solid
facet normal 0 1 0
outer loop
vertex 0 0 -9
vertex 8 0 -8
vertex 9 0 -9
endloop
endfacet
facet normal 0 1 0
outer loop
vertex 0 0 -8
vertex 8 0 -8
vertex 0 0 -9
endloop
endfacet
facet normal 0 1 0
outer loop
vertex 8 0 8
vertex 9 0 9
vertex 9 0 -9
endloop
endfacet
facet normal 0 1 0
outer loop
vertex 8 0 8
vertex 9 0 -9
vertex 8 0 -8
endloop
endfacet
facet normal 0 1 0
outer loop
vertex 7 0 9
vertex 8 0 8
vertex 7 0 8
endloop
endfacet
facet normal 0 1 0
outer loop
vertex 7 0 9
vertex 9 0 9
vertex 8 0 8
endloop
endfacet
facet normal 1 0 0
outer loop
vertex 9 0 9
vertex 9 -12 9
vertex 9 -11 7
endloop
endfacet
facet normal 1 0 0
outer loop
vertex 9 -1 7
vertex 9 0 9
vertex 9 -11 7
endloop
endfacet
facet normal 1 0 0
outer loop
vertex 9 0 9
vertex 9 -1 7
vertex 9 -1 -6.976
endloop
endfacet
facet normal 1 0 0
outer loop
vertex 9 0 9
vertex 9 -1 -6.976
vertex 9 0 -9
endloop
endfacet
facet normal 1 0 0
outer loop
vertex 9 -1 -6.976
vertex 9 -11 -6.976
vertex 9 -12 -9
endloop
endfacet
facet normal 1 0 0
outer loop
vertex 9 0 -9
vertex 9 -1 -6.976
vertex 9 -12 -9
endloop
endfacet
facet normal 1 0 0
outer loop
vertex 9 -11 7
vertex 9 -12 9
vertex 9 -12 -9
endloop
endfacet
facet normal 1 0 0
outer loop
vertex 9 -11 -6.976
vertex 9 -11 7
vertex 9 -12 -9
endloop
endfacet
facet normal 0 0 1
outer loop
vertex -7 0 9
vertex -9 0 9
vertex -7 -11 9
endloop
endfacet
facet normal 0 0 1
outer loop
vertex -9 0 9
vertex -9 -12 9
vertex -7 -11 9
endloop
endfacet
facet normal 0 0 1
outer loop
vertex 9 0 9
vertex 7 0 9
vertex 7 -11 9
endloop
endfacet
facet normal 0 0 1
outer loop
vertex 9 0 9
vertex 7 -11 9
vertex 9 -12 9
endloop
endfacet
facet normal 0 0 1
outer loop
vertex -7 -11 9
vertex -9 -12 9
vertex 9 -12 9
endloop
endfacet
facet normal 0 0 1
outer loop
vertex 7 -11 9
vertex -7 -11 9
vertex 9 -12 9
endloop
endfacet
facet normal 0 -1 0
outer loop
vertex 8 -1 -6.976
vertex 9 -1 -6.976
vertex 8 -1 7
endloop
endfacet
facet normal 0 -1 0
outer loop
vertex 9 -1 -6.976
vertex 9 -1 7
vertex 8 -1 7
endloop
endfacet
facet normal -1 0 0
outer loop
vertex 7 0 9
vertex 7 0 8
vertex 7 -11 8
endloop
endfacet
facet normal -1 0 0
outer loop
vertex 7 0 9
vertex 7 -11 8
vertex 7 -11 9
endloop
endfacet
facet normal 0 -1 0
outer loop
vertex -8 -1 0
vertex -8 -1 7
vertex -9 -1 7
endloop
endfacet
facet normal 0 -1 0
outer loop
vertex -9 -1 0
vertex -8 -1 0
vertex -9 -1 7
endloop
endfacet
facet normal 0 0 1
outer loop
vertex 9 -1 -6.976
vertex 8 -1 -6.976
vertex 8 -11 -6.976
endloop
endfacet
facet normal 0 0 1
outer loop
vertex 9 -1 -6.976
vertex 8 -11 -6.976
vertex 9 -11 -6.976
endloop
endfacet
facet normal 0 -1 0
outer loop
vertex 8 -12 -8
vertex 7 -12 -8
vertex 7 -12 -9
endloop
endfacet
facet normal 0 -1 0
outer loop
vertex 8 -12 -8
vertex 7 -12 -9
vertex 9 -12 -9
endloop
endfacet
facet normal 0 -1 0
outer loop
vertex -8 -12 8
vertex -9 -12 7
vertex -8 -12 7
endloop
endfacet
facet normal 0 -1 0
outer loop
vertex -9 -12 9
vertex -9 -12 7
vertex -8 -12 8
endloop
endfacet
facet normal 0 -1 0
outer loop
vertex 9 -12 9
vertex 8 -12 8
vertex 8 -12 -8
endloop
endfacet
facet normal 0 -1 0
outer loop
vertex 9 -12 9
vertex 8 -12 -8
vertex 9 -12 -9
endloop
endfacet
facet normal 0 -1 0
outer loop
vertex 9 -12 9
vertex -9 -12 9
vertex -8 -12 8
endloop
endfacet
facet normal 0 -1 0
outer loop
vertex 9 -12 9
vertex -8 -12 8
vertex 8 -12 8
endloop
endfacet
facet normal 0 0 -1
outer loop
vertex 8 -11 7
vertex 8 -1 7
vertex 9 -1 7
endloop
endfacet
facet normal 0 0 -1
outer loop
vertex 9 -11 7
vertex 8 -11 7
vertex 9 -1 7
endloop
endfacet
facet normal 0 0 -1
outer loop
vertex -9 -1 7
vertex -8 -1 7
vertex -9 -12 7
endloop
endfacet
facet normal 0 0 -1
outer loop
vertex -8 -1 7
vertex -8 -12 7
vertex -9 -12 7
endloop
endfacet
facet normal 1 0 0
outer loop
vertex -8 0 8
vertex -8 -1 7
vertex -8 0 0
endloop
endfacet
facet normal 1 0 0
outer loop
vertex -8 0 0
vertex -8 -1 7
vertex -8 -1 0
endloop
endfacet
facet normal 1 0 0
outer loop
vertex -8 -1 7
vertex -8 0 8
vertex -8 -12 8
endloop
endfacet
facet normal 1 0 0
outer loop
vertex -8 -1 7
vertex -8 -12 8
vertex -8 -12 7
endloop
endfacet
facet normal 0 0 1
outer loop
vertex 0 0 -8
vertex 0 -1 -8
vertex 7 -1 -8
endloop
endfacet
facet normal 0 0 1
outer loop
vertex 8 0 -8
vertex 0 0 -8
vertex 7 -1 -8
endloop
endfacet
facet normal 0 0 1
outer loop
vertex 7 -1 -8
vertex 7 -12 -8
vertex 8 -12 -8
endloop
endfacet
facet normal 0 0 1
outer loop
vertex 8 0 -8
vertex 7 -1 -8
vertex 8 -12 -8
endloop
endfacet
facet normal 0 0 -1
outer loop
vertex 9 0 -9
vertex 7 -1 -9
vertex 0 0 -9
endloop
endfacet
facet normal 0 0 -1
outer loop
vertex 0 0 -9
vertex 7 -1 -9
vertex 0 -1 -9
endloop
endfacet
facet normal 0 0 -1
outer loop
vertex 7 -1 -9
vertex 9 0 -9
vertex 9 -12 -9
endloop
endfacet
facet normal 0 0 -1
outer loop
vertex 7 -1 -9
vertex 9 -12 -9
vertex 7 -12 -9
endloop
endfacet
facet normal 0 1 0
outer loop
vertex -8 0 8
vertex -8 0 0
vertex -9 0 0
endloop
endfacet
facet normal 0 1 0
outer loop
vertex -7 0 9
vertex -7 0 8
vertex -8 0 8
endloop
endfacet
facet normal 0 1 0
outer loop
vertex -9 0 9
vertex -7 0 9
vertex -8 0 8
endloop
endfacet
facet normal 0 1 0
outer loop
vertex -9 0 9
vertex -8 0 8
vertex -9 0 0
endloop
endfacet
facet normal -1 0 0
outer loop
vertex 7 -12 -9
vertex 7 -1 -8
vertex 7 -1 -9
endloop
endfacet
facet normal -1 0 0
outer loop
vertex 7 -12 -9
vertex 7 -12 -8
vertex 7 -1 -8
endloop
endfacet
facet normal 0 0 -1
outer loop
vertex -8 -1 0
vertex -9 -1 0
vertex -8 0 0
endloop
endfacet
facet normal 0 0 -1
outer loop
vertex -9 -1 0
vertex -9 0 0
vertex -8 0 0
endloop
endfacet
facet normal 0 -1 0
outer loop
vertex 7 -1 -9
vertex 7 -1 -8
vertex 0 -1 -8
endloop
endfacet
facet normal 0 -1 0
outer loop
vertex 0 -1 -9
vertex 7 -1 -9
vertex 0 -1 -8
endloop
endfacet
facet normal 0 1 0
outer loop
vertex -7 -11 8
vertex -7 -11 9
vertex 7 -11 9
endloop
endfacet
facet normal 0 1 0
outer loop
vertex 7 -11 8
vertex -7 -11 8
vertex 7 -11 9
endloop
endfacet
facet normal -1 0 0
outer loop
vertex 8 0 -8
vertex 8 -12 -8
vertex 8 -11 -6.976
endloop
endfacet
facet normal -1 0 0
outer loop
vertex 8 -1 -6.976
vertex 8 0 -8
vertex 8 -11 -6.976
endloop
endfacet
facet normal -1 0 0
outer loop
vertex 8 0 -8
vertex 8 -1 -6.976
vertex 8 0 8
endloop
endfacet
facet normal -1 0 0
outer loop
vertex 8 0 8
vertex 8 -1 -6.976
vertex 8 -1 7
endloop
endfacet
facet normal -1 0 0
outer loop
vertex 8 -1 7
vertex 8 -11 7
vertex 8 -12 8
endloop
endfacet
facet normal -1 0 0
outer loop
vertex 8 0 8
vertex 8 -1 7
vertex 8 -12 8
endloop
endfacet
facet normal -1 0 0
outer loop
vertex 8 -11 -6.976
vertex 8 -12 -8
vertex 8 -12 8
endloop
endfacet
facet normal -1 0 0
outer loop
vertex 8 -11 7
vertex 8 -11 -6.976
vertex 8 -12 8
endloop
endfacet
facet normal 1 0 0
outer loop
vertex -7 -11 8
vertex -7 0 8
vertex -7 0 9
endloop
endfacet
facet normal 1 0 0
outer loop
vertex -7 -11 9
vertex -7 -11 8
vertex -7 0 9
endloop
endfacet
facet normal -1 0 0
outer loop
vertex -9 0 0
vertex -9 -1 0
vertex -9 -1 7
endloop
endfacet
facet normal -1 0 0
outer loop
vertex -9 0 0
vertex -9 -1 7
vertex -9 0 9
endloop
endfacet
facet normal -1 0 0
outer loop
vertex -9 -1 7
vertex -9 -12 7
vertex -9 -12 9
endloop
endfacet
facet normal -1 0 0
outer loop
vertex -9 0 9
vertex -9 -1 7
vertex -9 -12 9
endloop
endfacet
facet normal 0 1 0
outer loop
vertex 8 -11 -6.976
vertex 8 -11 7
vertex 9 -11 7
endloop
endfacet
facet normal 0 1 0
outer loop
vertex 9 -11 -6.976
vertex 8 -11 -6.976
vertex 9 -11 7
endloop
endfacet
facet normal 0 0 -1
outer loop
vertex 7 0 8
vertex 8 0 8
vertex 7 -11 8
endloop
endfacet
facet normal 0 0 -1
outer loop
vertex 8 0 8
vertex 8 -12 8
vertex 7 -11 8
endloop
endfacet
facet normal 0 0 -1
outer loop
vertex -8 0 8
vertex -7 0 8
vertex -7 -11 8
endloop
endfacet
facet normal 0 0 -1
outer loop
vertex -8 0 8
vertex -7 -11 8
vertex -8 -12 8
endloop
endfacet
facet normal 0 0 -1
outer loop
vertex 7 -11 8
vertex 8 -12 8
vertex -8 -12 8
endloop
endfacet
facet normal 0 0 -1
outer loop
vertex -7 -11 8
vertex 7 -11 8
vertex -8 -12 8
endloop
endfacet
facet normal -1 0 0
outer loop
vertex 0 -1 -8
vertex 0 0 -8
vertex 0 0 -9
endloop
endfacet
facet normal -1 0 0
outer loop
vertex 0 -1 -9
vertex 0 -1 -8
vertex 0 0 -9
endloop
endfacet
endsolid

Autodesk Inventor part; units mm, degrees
ref_plane "YZ Plane" through (0, 0, 0) normal (1, 0, 0) x (0, 1, 0)
ref_plane "XZ Plane" through (0, 0, 0) normal (0, 1, 0) x (-1, 0, 0)
ref_plane "XY Plane" through (0, 0, 0) normal (0, 0, 1) x (1, 0, 0)
sketch "Sketch1" plane through (0, 0, 0) normal (0, 1, 0) x (-1, 0, 0)
  line L0 (-9, -9) -> (-9, 9)
  line L1 (-9, 9) -> (9, 9)
  line L2 (-8, -8) -> (-8, 8)
  line L3 (-8, 8) -> (8, 8)
  line L4 (0, -8) -> (0, -9)
  line L5 (0, -9) -> (-1, -9)
  line L6 (-8, -8) -> (0, -8)
  line L7 (-9, -9) -> (0, -9)
  line L8 (9, 0) -> (9, 9)
  line L9 (8, 8) -> (8, 1)
  line L10 (9, 0) -> (8, 0)
  line L11 (8, 0) -> (8, 1.1953)
  line L12 (8, 8) -> (8, 9)
  line L13 (-8, 8) -> (-8, 9)
  line L14 (9, 9) -> (8, 9)
  line L15 (-8, 9) -> (-9, 9)
  line L16 (8, 8) -> (7, 8)
  line L17 (7, 8) -> (7, 9)
  line L18 (-8, 8) -> (-7, 8)
  line L19 (-7, 9) -> (-8, 9)
  line L20 (-8, 8) -> (-7, 8)
  line L21 (-7, 8) -> (-7, 9)
  point P0 (0, 0)
  point P1 (0, 11.1675)
  dimension "d4" = 18
  dimension "d5" = 18
  dimension "d10" = 16
  dimension "d11" = 16
  dimension "d33" = 1
  dimension "d62" = 1
  dimension "d63" = 1
extrude "Extrusion1" add sketch "Sketch1" against normal blind 1 contours L0 L1 L13 L2 L6 L4 L5 L7 | L1 L21 L3 L13 | L1 L12 L3 L17 | L1 L8 L10 L11 L9 L12
ref_plane "Work Plane1" through (0, -12, 0) normal (0, -1, 0) x (1, 0, 0)
ref_plane "Work Plane6" through (0, -1, 0) normal (0, -1, 0) x (1, 0, 0)
sketch "Sketch11" plane through (0, -1, 0) normal (0, -1, 0) x (1, 0, 0)
  line L0 (9, 9) -> (-9, 9) projected
  line L1 (-9, 9) -> (-9, 7)
  line L2 (-9, 0) -> (-9, 9) projected
  line L3 (-8, 0) -> (-8, 8) projected
  line L4 (-8, 8) -> (8, 8) projected
  line L5 (-8, 7) -> (-8, 8)
  line L6 (-8, 8) -> (-7, 8)
  line L7 (-7, 8) -> (-7, 9)
  line L8 (-7, 9) -> (-9, 9)
  line L9 (-9, 7) -> (-8, 7)
  line L10 (9, -9) -> (9, 9) projected
  line L11 (9, 9) -> (7, 9)
  line L12 (7, 9) -> (7, 8)
  line L13 (7, 8) -> (8, 8)
  line L14 (8, 8) -> (8, 7)
  line L15 (8, 8) -> (8, -8) projected
  line L16 (9, 7) -> (9, 9)
  line L17 (8, 7) -> (9, 7)
  line L18 (8, -7.9765) -> (8, -6.9765)
  line L19 (8, -6.9765) -> (9, -6.9765)
  line L20 (9, -9) -> (7, -9)
  line L21 (0, -9) -> (9, -9) projected
  line L22 (8, -8) -> (0, -8) projected
  line L23 (7, -8) -> (8, -8)
  line L24 (8, -8) -> (7, -8)
  line L25 (7, -9) -> (7, -8)
  point P0 (0, 0)
  dimension "d54" = 2
  dimension "d55" = 1
  dimension "d56" = 2
  dimension "d57" = 1
extrude "Extrusion5" add sketch "Sketch11" along normal blind 10 contours L10 L17 L14 L4 L12 L0 | L7 L4 L3 L9 L1 L0 | L10 L20 L25 L22 L15 L19
sketch "Sketch12" plane through (0, -12, 0) normal (0, -1, 0) x (1, 0, 0)
  line L0 (9, 9) -> (9, -9) projected
  line L1 (9, 9) -> (9, -9)
  line L2 (9, -9) -> (7.0041, -9)
  line L3 (9, -9) -> (0, -9) projected
  line L4 (7, -8) -> (7, -9) projected
  line L5 (7, -8) -> (8, -8)
  line L6 (8, -8) -> (8, 8) projected
  line L7 (8, -8) -> (8, 8)
  line L8 (8, 8) -> (-8, 8) projected
  line L9 (8, 8) -> (-8, 8)
  line L10 (-8, 8) -> (-8, 7.0773)
  line L11 (-8, 8) -> (-8, 0) projected
  line L12 (-8, 7) -> (-9, 7) projected
  line L13 (-9, 0) -> (-9, 9) projected
  line L14 (-9, 7) -> (-9, 9)
  line L15 (-9, 9) -> (9, 9) projected
  line L16 (-9, 9) -> (9, 9)
  point P0 (0, 0)
extrude "Extrusion6" add sketch "Sketch12" against normal blind 1
properties part number "mousecap"
